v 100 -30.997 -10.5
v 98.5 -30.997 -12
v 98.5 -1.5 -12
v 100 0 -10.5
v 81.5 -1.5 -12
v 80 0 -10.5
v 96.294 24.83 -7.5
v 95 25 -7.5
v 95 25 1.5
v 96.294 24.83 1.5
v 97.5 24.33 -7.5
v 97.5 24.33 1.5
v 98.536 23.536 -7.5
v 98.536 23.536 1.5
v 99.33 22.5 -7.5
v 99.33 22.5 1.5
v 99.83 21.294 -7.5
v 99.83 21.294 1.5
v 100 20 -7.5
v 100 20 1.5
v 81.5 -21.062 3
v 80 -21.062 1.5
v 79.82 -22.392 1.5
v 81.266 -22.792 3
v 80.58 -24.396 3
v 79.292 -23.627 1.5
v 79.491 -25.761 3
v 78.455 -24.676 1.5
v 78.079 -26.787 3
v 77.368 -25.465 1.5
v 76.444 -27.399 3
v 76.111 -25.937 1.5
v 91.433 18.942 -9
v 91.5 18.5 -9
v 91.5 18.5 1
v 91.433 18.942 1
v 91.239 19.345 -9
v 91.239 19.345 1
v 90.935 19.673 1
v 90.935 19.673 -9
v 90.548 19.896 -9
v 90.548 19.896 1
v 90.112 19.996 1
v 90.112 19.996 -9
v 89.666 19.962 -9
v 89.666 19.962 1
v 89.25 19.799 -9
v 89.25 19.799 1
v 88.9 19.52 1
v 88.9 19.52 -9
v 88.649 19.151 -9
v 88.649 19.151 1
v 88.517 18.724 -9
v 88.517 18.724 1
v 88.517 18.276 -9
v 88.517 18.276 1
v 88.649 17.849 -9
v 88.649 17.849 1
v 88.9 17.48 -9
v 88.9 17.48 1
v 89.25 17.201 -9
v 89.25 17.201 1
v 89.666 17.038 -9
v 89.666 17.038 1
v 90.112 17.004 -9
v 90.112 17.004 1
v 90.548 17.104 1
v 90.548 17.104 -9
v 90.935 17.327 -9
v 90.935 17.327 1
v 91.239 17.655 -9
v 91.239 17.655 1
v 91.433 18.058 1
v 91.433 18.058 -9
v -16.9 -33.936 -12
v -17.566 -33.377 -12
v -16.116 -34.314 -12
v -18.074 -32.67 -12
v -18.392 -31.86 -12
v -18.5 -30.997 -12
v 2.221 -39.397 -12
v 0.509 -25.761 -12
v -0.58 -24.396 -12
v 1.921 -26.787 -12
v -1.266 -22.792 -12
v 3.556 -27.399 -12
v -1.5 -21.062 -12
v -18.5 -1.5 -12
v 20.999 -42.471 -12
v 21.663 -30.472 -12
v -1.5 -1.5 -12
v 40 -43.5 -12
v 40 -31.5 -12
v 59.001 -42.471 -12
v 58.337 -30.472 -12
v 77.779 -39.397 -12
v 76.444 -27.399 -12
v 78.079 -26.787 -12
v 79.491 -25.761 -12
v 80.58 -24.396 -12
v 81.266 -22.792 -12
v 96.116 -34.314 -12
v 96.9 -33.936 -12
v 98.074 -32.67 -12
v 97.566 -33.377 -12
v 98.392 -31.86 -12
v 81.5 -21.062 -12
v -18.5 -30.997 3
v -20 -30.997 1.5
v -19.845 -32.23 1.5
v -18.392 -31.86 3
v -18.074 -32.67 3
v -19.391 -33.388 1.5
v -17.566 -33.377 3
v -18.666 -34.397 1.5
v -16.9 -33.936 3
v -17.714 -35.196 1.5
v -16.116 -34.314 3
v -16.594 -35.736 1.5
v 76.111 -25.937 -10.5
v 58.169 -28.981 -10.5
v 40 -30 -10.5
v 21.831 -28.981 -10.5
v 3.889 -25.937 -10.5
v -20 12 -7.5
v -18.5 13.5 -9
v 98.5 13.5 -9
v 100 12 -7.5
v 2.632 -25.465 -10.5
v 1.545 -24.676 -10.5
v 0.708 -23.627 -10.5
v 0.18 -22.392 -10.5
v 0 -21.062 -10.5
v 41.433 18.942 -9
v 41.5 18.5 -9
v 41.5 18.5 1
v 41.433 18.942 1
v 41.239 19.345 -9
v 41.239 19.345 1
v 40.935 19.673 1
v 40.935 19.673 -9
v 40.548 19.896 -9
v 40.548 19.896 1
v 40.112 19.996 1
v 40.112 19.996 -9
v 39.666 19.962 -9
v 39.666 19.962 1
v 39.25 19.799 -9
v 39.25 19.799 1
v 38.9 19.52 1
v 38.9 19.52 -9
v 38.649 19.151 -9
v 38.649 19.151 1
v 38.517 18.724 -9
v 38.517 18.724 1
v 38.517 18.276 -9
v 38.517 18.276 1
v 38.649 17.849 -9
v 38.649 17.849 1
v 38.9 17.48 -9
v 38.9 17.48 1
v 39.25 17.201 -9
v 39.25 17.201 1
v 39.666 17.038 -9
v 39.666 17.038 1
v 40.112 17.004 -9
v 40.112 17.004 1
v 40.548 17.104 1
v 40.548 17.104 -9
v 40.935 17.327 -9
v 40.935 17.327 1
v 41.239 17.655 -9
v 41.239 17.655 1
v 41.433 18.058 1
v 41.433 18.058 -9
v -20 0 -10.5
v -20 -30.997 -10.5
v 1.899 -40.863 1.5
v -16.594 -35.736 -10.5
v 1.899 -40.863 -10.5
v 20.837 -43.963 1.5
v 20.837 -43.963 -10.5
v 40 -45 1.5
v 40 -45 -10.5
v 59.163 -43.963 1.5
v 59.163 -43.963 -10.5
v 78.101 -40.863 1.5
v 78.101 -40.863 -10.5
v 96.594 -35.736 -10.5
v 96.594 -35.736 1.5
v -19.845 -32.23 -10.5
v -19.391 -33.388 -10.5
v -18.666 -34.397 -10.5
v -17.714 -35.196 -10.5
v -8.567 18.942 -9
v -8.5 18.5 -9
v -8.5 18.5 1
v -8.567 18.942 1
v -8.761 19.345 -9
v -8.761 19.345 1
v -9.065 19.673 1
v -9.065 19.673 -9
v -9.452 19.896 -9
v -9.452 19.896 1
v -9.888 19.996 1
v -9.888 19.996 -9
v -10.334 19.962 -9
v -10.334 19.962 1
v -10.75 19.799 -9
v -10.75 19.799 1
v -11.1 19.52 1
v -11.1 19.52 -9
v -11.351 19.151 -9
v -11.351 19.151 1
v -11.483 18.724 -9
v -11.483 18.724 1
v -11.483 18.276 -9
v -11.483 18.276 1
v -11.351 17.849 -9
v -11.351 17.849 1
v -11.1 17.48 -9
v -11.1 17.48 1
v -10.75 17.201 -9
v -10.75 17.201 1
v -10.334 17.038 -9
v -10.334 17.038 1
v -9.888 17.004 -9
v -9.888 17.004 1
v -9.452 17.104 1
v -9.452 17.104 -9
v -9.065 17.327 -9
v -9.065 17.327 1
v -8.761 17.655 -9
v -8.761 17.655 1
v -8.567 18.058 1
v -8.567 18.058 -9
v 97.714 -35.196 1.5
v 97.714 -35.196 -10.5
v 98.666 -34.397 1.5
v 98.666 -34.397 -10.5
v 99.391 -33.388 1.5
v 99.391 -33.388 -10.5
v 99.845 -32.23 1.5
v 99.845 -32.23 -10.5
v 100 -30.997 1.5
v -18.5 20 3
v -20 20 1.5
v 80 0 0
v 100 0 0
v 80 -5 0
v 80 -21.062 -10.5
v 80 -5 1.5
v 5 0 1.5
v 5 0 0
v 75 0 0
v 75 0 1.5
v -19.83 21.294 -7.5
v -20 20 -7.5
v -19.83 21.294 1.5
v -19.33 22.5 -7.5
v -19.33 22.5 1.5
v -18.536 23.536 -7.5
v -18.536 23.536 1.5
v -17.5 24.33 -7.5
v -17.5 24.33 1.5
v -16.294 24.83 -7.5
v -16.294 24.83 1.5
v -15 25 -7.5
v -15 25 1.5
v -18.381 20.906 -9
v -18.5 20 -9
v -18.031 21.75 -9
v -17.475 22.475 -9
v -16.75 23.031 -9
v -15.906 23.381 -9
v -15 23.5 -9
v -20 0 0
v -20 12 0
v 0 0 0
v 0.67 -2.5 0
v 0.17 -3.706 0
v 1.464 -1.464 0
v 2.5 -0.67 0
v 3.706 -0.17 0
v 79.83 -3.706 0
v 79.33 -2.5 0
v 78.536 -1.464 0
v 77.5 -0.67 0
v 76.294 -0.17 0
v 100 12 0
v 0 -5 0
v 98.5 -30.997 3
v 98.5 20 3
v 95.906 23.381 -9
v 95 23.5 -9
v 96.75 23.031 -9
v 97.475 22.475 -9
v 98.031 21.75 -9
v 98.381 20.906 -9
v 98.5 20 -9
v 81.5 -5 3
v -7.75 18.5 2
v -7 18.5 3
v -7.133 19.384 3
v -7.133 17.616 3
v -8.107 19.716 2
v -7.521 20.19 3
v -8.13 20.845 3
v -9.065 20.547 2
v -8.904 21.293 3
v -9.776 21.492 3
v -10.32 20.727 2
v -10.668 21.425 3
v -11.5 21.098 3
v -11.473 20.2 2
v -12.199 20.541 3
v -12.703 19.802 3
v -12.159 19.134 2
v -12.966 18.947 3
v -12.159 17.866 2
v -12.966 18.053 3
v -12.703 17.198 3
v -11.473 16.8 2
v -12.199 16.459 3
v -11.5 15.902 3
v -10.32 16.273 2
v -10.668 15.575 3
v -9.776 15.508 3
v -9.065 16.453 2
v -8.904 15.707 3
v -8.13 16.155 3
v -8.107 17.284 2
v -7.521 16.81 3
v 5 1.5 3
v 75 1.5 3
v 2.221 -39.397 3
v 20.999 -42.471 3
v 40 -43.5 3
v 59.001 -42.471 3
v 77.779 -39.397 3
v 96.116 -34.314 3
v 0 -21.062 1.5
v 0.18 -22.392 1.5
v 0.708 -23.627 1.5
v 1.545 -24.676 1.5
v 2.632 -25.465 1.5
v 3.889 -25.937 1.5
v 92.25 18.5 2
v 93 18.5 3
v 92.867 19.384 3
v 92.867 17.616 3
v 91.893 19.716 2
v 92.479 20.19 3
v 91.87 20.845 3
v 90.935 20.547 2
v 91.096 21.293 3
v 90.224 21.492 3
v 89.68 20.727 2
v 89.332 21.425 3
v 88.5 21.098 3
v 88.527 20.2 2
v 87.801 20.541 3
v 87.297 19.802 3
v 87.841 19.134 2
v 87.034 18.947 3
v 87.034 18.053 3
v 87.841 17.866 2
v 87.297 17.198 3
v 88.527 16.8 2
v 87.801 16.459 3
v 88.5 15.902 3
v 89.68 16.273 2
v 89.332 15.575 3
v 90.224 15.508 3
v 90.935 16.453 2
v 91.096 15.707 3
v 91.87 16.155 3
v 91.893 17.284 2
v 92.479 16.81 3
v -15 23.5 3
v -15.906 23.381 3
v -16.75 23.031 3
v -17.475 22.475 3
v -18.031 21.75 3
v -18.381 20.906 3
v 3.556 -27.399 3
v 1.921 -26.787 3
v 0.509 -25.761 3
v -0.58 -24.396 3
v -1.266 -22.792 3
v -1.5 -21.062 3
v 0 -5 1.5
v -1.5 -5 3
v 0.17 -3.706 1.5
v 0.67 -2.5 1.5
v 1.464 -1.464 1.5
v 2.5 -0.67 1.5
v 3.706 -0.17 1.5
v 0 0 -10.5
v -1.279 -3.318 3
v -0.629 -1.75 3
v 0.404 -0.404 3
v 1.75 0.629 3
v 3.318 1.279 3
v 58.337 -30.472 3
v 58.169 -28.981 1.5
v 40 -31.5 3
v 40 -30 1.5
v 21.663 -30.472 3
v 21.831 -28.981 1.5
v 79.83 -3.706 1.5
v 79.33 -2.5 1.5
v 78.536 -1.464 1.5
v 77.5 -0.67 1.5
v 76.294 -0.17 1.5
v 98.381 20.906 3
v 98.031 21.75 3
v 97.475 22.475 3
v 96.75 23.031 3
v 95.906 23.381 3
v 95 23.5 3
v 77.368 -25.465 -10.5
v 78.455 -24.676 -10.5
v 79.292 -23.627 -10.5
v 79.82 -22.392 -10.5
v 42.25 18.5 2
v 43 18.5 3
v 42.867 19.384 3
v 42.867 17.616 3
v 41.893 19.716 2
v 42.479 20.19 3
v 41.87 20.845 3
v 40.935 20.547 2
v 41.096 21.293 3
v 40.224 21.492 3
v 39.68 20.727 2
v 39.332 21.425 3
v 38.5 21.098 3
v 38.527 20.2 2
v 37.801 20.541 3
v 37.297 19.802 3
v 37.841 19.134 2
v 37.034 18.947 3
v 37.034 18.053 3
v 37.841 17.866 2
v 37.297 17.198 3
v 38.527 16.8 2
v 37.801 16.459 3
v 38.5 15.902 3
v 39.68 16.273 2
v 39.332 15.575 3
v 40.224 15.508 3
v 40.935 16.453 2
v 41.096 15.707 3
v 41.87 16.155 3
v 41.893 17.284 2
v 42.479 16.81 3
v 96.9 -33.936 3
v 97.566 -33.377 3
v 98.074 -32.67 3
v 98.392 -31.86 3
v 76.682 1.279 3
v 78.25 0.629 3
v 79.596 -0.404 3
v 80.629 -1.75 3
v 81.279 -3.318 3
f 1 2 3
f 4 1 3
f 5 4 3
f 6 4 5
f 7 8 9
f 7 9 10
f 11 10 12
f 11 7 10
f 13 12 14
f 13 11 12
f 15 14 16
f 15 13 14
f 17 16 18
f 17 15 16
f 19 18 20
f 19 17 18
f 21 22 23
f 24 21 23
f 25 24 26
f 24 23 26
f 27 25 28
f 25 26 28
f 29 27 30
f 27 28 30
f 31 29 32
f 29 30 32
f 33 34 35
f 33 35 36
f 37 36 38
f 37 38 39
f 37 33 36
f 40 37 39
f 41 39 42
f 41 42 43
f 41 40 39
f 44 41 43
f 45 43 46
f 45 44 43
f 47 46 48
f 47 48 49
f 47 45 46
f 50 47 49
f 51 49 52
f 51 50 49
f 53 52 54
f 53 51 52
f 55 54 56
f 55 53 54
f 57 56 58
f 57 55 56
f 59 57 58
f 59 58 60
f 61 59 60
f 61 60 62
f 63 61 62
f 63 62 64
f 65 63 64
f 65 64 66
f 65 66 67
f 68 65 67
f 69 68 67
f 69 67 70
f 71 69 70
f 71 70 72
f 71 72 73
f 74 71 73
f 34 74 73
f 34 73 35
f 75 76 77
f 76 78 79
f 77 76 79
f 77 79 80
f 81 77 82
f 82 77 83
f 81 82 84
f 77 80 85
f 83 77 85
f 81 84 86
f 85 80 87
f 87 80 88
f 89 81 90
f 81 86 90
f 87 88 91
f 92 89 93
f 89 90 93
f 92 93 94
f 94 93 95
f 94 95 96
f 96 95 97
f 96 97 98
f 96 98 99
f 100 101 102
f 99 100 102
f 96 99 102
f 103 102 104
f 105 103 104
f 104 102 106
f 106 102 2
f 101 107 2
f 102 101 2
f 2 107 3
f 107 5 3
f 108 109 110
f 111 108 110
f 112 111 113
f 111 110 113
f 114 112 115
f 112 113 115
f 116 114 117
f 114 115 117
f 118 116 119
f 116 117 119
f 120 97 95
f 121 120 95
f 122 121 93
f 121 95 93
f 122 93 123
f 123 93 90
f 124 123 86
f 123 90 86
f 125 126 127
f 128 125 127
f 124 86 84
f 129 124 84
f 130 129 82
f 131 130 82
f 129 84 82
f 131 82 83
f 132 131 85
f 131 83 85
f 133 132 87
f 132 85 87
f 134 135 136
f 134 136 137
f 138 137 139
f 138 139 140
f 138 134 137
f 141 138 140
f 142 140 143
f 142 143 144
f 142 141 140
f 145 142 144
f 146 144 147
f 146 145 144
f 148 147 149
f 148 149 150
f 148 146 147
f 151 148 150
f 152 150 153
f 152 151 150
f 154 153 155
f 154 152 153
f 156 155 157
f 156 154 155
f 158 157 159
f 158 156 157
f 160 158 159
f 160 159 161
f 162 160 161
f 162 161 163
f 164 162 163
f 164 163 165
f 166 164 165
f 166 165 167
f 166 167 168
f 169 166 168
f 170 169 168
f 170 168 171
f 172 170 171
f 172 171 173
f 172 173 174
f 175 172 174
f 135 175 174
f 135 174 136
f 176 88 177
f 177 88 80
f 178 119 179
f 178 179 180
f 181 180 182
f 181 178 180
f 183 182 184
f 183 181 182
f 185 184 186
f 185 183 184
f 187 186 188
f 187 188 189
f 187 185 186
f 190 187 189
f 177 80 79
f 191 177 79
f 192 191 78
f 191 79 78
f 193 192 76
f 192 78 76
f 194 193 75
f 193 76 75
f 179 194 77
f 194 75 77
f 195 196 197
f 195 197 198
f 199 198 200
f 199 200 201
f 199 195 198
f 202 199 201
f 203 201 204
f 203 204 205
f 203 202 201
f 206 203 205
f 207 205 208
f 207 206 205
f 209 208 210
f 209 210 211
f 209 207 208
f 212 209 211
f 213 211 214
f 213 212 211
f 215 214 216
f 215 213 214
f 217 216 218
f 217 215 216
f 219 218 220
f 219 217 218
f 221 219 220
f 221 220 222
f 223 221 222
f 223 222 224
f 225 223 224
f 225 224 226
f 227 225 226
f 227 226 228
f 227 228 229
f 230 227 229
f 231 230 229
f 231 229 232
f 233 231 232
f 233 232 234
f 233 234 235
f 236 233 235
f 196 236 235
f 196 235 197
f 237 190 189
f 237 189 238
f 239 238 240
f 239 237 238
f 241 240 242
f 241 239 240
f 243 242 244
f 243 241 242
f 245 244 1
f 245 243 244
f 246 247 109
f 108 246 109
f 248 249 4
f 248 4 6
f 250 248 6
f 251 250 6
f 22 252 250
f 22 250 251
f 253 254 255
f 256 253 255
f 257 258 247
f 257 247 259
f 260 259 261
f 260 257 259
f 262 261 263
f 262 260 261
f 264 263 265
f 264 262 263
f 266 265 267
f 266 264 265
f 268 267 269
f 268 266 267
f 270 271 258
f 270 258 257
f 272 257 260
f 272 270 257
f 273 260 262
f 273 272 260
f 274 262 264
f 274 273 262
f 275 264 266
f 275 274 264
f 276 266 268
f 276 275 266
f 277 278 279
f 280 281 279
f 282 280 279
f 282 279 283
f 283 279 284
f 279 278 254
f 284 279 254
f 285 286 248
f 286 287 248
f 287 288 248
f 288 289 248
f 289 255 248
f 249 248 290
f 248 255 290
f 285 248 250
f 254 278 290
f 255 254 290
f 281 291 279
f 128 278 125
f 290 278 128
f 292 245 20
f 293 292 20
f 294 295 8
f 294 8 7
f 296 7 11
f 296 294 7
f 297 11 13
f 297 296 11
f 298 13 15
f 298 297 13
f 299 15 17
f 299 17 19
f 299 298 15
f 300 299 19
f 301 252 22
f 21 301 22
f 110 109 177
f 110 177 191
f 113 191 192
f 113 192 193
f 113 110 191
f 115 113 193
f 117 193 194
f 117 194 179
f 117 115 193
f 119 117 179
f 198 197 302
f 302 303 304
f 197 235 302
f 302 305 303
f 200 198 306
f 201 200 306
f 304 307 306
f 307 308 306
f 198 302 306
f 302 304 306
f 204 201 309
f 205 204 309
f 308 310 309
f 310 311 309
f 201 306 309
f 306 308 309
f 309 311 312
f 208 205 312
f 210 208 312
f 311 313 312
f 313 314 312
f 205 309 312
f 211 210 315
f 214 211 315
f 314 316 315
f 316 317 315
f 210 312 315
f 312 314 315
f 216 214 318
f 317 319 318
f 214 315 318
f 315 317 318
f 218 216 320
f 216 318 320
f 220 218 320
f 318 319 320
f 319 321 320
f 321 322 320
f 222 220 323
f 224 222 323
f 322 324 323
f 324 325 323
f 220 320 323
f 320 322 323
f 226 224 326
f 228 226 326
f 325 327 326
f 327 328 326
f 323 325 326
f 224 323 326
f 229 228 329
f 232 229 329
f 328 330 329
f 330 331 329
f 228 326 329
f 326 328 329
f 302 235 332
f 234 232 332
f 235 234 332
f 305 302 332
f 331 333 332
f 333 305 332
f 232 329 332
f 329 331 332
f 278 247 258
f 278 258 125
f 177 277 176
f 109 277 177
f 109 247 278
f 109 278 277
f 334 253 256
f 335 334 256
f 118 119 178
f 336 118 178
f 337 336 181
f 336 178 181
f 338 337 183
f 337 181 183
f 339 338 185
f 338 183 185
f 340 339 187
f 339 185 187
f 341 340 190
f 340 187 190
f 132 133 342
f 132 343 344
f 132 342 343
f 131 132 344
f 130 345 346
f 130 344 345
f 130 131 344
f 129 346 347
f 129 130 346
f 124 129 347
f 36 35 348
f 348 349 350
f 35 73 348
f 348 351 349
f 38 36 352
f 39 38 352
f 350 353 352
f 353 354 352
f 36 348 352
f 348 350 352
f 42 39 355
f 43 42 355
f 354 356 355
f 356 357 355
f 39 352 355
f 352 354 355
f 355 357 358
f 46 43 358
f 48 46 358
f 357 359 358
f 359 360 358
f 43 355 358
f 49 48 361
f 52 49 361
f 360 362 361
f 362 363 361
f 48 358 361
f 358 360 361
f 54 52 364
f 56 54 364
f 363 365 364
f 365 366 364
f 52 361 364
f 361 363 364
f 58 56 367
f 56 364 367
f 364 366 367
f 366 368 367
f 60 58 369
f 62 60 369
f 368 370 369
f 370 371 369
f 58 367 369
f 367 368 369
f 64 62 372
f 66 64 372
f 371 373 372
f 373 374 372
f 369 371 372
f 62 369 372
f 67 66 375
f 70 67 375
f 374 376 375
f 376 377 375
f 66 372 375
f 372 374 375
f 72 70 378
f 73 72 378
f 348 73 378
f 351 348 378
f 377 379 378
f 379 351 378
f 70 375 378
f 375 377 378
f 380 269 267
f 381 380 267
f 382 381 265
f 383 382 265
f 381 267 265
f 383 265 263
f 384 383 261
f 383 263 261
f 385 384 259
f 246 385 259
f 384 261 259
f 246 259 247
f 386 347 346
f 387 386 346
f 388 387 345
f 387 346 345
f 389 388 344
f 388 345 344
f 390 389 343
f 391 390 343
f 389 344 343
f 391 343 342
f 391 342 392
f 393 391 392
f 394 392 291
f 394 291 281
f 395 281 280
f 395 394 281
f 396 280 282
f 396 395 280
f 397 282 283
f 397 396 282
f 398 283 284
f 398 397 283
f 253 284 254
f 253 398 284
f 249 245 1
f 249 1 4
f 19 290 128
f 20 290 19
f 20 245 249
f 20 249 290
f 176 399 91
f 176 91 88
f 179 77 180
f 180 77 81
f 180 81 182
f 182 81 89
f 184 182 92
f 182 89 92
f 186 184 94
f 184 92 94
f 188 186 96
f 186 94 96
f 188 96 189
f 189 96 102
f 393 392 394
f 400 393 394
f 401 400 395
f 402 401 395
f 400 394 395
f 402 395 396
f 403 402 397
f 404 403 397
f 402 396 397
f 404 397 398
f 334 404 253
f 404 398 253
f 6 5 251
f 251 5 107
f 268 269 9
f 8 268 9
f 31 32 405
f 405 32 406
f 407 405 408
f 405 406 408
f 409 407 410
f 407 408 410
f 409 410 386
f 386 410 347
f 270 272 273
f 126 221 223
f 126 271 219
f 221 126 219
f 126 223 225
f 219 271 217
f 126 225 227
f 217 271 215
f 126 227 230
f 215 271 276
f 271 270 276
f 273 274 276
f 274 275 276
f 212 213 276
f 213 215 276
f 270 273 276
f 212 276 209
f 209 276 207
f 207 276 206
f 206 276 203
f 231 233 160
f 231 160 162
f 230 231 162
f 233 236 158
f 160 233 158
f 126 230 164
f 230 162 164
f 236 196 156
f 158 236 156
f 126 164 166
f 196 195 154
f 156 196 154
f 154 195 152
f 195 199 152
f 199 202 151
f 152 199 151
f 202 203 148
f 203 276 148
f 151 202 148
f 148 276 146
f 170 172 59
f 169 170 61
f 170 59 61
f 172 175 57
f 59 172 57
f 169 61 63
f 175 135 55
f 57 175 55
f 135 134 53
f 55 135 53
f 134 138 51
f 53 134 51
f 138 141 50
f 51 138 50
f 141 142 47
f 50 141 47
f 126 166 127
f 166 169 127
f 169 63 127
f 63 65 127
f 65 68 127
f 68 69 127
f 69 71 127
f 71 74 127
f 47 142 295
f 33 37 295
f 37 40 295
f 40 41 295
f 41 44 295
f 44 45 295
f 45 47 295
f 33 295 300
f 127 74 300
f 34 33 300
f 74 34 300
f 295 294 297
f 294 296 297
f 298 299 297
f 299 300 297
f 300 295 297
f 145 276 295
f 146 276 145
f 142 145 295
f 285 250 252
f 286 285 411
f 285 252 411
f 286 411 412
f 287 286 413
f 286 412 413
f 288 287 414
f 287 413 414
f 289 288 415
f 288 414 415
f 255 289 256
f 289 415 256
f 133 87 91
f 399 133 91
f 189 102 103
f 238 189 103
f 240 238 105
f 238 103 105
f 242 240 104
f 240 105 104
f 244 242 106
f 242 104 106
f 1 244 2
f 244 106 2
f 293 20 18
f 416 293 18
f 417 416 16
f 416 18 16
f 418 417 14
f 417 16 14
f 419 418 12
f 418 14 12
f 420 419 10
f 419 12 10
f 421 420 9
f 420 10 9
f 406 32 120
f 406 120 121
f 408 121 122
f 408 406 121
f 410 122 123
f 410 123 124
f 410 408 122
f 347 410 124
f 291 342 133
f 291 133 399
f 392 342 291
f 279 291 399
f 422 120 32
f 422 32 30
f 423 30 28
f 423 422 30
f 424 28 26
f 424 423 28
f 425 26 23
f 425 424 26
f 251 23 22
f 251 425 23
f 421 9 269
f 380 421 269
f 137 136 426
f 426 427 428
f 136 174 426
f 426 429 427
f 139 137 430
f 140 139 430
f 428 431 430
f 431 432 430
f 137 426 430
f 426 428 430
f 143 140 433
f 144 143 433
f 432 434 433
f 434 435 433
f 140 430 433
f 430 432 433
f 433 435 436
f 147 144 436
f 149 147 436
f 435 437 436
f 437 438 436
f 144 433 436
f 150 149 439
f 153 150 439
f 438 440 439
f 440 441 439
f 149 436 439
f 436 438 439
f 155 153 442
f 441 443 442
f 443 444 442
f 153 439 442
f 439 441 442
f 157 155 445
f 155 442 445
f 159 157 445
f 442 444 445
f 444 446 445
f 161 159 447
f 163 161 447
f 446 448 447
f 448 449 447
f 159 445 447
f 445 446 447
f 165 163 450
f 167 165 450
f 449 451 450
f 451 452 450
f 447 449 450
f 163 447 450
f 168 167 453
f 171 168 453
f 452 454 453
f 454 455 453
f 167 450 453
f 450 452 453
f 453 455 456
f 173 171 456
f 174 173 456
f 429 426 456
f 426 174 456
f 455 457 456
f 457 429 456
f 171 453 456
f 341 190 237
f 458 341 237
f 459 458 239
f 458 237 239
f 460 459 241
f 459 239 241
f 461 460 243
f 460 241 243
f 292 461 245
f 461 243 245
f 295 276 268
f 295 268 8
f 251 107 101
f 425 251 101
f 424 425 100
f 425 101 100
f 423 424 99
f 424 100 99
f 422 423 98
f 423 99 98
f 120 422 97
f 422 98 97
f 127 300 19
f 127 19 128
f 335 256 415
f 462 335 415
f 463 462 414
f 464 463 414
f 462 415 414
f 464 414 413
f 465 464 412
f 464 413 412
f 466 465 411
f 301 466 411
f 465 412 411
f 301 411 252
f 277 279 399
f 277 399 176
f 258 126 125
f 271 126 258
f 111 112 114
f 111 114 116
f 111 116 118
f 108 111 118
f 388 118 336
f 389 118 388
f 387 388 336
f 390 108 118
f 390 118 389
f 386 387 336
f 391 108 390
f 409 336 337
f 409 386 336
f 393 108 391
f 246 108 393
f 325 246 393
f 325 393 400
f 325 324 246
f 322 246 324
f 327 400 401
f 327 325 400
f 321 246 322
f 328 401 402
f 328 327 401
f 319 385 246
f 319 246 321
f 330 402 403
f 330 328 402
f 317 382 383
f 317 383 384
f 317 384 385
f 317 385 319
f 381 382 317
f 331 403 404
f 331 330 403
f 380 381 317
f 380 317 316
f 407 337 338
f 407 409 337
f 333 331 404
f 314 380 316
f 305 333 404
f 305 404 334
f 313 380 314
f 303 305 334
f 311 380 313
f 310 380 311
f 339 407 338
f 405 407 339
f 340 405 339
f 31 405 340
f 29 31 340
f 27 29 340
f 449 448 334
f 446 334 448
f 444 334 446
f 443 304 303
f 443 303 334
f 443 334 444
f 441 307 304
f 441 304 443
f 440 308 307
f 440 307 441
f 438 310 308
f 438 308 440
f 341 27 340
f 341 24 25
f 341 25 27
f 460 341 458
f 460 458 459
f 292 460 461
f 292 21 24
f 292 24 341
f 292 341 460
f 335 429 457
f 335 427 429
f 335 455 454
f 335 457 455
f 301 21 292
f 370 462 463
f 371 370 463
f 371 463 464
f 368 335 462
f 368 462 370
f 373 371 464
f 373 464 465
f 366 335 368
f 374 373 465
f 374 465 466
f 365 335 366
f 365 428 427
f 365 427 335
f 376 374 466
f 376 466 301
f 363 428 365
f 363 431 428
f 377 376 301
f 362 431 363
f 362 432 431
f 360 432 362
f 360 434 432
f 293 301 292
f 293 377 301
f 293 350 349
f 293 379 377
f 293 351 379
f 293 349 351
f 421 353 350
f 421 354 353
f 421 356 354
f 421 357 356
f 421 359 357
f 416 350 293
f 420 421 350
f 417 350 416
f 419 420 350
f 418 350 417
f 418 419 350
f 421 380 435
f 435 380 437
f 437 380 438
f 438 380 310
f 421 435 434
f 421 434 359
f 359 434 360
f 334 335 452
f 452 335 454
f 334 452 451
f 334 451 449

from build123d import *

# Parameters (mm, degrees)
F0_W       = 120
F0_H       = 13
F0_R       = 1.5
F1_DEPTH   = 3
F2_DEPTH   = 9
F3_DEPTH   = 12
F4_R       = 5
F5_SIZE2   = 1.5
F5_SIZE    = 2
F5_2_SIZE2 = 1.5
F5_2_SIZE  = 2
F5_3_SIZE2 = 1.5
F5_3_SIZE  = 2
F6_SIZE    = 1.5


with BuildPart() as f1:
    # F0 (on Top) → F1 (new body)
    with BuildSketch(Plane.XY):
        with Locations((40, 18.5)):
            Rectangle(F0_W, F0_H)
        with Locations((-10, 18.5)):
            Circle(F0_R, mode=Mode.SUBTRACT)
        with Locations((40, 18.5)):
            Circle(F0_R, mode=Mode.SUBTRACT)
        with Locations((90, 18.5)):
            Circle(F0_R, mode=Mode.SUBTRACT)
        Polygon((-20, 0), (0, 0), (80, 0), (100, 0), (100, 12), (-20, 12), align=None)
        with BuildLine():
            Line((0, -25), (0, 0))
            Line((0, 0), (-20, 0))
            Line((-20, 0), (-20, -34.5516387229))
            ThreePointArc((-20, -34.5516387229), (40, -45), (100, -34.5516387229))
            Line((100, -34.5516387229), (100, 0))
            Line((100, 0), (80, 0))
            Line((80, 0), (80, -25))
            ThreePointArc((80, -25), (40, -30), (0, -25))
        make_face()
    extrude(amount=F1_DEPTH)

    # F0 (on Top) → F2 (join)
    with BuildSketch(Plane.XY):
        with Locations((40, 18.5)):
            Rectangle(F0_W, F0_H)
        with Locations((-10, 18.5)):
            Circle(F0_R, mode=Mode.SUBTRACT)
        with Locations((40, 18.5)):
            Circle(F0_R, mode=Mode.SUBTRACT)
        with Locations((90, 18.5)):
            Circle(F0_R, mode=Mode.SUBTRACT)
    extrude(amount=-F2_DEPTH)

    # F0 (on Top) → F3 (join)
    with BuildSketch(Plane.XY):
        with BuildLine():
            Line((0, -25), (0, 0))
            Line((0, 0), (-20, 0))
            Line((-20, 0), (-20, -34.5516387229))
            ThreePointArc((-20, -34.5516387229), (40, -45), (100, -34.5516387229))
            Line((100, -34.5516387229), (100, 0))
            Line((100, 0), (80, 0))
            Line((80, 0), (80, -25))
            ThreePointArc((80, -25), (40, -30), (0, -25))
        make_face()
    extrude(amount=-F3_DEPTH)

    # F4
    f4_edges = [f1.edges().sort_by_distance(p)[0] for p in [
        (-20, -34.551639, -4.5),
        (100, -34.551639, -4.5),
        (0, 0, 1.5),
        (80, 0, 1.5),
        (80, -25, -4.5),
        (0, -25, -4.5),
        (100, 25, -3),
        (-20, 25, -3),
    ]]
    fillet(f4_edges, radius=F4_R)

    # F5
    f5_edges = [f1.edges().sort_by_distance(p)[0] for p in [
        (-11.5, 18.5, 3),
    ]]
    f5_side = f1.faces().sort_by_distance((-11.5, 18.5, -3))[0]
    chamfer(f5_edges, length=F5_SIZE, length2=F5_SIZE2, reference=f5_side)

    # F5#2
    f5_2_edges = [f1.edges().sort_by_distance(p)[0] for p in [
        (38.5, 18.5, 3),
    ]]
    f5_2_side = f1.faces().sort_by_distance((38.5, 18.5, -3))[0]
    chamfer(f5_2_edges, length=F5_2_SIZE, length2=F5_2_SIZE2, reference=f5_2_side)

    # F5#3
    f5_3_edges = [f1.edges().sort_by_distance(p)[0] for p in [
        (88.5, 18.5, 3),
    ]]
    f5_3_side = f1.faces().sort_by_distance((88.5, 18.5, -3))[0]
    chamfer(f5_3_edges, length=F5_3_SIZE, length2=F5_3_SIZE2, reference=f5_3_side)

    # F6
    f6_edges = [f1.edges().sort_by_distance(p)[0] for p in [
        (40, 0, 3),
        (-20, -5.498471, 3),
        (100, -15.498471, -12),
        (99.060235, -33.914902, -12),
        (90, 0, -12),
        (40, -45, -12),
        (80, -10.530938, -12),
        (-19.060235, -33.914902, -12),
        (78.90868, -24.179925, -12),
        (-20, -15.498471, -12),
        (40, -30, -12),
        (-10, 0, -12),
        (1.09132, -24.179925, -12),
        (0, -10.530938, -12),
        (40, 12, -9),
        (40, 25, -9),
    ]]
    chamfer(f6_edges, length=F6_SIZE)


solid = f1.part
